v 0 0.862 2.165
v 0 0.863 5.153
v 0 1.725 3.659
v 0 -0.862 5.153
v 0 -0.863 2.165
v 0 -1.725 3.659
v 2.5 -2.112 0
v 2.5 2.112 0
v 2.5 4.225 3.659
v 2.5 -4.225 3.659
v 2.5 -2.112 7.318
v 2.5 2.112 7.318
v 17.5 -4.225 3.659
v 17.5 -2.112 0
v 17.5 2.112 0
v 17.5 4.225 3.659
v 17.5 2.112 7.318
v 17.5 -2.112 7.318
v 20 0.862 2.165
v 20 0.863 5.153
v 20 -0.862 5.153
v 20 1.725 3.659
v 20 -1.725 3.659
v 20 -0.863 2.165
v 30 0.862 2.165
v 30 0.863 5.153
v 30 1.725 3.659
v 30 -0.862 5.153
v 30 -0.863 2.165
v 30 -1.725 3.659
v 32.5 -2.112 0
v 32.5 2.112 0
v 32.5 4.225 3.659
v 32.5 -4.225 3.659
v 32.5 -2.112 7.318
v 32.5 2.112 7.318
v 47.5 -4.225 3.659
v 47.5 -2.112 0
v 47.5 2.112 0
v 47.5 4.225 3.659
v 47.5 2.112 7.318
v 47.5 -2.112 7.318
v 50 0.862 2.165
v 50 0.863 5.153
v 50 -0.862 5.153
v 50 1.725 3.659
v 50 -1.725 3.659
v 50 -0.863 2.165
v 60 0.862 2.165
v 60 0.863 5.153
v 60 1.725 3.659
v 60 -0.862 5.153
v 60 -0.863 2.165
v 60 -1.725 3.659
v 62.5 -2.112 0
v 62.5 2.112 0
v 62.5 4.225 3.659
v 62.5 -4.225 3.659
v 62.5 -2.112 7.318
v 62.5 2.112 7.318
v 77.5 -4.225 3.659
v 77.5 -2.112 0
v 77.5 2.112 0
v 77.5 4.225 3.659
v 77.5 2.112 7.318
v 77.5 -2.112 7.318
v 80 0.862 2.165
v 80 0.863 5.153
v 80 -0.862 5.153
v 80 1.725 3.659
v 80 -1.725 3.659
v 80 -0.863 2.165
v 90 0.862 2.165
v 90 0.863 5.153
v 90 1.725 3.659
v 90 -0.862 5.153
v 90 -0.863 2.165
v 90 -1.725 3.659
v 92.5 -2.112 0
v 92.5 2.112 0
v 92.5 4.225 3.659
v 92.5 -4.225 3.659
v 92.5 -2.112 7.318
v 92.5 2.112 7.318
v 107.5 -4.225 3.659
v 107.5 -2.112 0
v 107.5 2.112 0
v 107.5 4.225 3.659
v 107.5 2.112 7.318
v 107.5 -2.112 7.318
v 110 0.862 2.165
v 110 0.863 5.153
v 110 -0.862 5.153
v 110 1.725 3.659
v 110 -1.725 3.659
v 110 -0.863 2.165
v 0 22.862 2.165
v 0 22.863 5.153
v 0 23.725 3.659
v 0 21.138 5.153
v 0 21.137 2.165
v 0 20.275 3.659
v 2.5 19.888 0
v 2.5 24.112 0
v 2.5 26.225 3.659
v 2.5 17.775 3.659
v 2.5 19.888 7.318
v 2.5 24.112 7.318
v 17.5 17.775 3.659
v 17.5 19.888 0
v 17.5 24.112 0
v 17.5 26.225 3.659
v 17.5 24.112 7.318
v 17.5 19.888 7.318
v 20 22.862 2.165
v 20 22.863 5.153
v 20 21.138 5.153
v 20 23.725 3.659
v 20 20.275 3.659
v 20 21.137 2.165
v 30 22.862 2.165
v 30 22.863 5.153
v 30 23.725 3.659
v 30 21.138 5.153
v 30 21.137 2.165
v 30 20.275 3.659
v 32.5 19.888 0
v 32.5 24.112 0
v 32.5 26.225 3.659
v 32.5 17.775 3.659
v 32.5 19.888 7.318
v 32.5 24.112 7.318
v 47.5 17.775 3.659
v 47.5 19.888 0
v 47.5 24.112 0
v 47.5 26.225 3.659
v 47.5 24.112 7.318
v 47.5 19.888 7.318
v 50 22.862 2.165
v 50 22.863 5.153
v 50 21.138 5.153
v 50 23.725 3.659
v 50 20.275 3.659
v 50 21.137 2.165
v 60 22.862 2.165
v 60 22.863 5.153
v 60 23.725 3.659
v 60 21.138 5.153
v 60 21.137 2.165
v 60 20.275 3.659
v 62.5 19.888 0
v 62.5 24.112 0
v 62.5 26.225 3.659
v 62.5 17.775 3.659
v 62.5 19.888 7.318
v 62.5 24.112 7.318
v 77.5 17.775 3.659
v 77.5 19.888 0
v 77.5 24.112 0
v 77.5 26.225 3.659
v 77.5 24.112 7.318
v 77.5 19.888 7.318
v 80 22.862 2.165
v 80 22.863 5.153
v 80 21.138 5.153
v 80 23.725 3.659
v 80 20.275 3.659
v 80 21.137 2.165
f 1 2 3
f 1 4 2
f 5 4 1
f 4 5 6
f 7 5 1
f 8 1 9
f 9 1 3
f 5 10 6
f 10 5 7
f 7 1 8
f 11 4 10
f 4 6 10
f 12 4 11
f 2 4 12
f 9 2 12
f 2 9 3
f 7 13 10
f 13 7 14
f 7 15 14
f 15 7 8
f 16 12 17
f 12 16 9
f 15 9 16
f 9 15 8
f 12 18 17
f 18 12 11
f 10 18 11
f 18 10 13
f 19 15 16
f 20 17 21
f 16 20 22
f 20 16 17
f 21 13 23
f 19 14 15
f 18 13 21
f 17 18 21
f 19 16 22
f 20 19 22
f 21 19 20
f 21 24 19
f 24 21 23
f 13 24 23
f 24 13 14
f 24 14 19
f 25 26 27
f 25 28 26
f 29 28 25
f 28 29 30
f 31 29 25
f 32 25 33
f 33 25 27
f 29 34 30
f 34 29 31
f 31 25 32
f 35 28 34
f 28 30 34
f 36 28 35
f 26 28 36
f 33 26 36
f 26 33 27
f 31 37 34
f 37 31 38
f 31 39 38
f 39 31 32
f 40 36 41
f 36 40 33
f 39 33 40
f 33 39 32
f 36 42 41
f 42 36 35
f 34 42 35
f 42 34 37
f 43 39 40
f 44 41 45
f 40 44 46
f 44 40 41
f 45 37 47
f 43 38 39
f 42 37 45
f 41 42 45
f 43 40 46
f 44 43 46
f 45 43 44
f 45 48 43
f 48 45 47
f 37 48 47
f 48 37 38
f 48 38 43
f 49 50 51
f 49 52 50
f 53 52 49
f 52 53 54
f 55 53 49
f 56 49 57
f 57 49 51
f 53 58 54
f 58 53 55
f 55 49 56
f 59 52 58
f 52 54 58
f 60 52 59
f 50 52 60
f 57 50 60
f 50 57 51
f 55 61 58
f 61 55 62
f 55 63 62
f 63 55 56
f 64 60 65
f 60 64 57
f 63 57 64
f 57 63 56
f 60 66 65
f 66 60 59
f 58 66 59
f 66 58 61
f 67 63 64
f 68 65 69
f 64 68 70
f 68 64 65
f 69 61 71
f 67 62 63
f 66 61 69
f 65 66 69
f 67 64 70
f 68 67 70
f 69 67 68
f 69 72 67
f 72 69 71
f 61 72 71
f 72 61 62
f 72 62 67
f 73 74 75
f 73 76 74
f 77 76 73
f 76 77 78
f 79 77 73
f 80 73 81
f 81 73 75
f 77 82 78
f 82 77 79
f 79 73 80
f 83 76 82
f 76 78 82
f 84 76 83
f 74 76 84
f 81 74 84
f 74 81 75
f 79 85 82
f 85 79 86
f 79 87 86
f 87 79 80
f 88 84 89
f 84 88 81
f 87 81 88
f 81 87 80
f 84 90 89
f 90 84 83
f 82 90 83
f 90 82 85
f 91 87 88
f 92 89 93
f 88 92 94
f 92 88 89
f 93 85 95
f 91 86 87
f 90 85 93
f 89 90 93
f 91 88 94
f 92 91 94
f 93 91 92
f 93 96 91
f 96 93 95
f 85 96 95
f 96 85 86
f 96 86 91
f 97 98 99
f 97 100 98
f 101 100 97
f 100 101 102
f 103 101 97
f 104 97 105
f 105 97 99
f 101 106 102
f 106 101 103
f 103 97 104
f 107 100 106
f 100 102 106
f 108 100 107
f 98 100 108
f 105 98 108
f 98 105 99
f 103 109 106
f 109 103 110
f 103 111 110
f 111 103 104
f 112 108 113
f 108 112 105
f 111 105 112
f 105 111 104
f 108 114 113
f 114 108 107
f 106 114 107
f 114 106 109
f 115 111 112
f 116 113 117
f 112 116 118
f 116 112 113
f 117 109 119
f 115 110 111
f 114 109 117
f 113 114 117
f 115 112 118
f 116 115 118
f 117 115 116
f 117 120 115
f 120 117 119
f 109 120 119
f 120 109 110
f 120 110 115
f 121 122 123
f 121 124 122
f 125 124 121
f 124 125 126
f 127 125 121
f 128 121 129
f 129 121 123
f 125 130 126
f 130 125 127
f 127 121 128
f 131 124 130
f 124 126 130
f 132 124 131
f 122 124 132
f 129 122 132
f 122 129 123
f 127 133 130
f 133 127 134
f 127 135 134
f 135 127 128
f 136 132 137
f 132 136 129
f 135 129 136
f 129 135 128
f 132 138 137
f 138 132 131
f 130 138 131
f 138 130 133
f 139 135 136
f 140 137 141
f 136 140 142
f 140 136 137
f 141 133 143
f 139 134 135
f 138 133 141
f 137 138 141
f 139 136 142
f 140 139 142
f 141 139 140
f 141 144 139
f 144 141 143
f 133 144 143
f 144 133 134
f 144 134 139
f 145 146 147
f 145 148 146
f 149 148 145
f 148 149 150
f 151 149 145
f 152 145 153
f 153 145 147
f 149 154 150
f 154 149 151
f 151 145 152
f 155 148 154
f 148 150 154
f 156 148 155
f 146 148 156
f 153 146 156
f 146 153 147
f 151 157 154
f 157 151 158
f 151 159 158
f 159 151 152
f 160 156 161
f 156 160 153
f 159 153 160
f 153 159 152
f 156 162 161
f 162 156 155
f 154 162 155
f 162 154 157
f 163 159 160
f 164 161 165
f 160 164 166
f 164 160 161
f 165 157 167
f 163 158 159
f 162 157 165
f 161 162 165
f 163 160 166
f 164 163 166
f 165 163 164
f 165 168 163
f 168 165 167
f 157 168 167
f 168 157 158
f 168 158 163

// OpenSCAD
// file: ../peg.scad
// peg.scad
// version: 0.4.0
// Prototype laid-down hex peg for vertical Hutchfinity casing stacks.

$fn = 64;
EPS = 0.01;

// Diameter is point-to-point across the hex. The default matches the current
// casing socket default: 8.0mm nominal peg + 0.45mm socket clearance.
PEG_DIAMETER = 8.45;
PEG_LENGTH = 20.0;
PEG_END_CHAMFER = 2.5;
PEG_CORE_SIDES = 6;
PEG_PRINT_FACE_ROTATION = 30;

function peg_tip_diameter(diameter, chamfer) = max(0.8, diameter - 2 * chamfer);
function peg_flat_to_flat_diameter(diameter, core_sides) =
    diameter * cos(180 / core_sides);

module chamfered_peg_core(diameter, length, chamfer, core_sides) {
    tip_d = peg_tip_diameter(diameter, chamfer);

    union() {
        cylinder(d1=tip_d, d2=diameter, h=chamfer, $fn=core_sides);
        translate([0, 0, chamfer])
            cylinder(d=diameter, h=max(EPS, length - 2 * chamfer), $fn=core_sides);
        translate([0, 0, length - chamfer])
            cylinder(d1=diameter, d2=tip_d, h=chamfer, $fn=core_sides);
    }
}

module hutchfinity_peg(
    diameter=PEG_DIAMETER,
    length=PEG_LENGTH,
    end_chamfer=PEG_END_CHAMFER,
    core_sides=PEG_CORE_SIDES
) {
    chamfer = min(end_chamfer, length / 2 - EPS);

    assert(diameter > 0 && length > 0, "peg diameter and length must be positive");
    assert(end_chamfer >= 0, "peg end chamfer must be non-negative");
    assert(core_sides >= 3, "peg core needs at least three sides");

    chamfered_peg_core(diameter, length, chamfer, core_sides);
}

module hutchfinity_peg_print_layout(
    diameter=PEG_DIAMETER,
    length=PEG_LENGTH,
    end_chamfer=PEG_END_CHAMFER,
    core_sides=PEG_CORE_SIDES,
    print_face_rotation=PEG_PRINT_FACE_ROTATION
) {
    translate([0, 0, peg_flat_to_flat_diameter(diameter, core_sides) / 2])
        rotate([0, 90, 0])
            rotate([0, 0, print_face_rotation])
                hutchfinity_peg(
                    diameter=diameter,
                    length=length,
                    end_chamfer=end_chamfer,
                    core_sides=core_sides
                );
}

hutchfinity_peg_print_layout();
// main file
// hex_peg_set.scad
// version: 0.1.0
// Printable set of loose hex pegs for one representative casing stack interface.

use <../peg.scad>;

PEG_COUNT = 7;
PEG_COLUMNS = 4;
PEG_X_PITCH = 30;
PEG_Y_PITCH = 22;

module hex_peg_set(
    peg_count = PEG_COUNT,
    peg_columns = PEG_COLUMNS,
    peg_x_pitch = PEG_X_PITCH,
    peg_y_pitch = PEG_Y_PITCH
) {
    assert(peg_count > 0, "peg_count must be positive");
    assert(peg_columns > 0, "peg_columns must be positive");
    assert(peg_x_pitch > 0 && peg_y_pitch > 0,
        "peg set pitch values must be positive");

    for (i = [0 : peg_count - 1])
        translate([
            (i % peg_columns) * peg_x_pitch,
            floor(i / peg_columns) * peg_y_pitch,
            0
        ])
        hutchfinity_peg_print_layout();
}

hex_peg_set();
